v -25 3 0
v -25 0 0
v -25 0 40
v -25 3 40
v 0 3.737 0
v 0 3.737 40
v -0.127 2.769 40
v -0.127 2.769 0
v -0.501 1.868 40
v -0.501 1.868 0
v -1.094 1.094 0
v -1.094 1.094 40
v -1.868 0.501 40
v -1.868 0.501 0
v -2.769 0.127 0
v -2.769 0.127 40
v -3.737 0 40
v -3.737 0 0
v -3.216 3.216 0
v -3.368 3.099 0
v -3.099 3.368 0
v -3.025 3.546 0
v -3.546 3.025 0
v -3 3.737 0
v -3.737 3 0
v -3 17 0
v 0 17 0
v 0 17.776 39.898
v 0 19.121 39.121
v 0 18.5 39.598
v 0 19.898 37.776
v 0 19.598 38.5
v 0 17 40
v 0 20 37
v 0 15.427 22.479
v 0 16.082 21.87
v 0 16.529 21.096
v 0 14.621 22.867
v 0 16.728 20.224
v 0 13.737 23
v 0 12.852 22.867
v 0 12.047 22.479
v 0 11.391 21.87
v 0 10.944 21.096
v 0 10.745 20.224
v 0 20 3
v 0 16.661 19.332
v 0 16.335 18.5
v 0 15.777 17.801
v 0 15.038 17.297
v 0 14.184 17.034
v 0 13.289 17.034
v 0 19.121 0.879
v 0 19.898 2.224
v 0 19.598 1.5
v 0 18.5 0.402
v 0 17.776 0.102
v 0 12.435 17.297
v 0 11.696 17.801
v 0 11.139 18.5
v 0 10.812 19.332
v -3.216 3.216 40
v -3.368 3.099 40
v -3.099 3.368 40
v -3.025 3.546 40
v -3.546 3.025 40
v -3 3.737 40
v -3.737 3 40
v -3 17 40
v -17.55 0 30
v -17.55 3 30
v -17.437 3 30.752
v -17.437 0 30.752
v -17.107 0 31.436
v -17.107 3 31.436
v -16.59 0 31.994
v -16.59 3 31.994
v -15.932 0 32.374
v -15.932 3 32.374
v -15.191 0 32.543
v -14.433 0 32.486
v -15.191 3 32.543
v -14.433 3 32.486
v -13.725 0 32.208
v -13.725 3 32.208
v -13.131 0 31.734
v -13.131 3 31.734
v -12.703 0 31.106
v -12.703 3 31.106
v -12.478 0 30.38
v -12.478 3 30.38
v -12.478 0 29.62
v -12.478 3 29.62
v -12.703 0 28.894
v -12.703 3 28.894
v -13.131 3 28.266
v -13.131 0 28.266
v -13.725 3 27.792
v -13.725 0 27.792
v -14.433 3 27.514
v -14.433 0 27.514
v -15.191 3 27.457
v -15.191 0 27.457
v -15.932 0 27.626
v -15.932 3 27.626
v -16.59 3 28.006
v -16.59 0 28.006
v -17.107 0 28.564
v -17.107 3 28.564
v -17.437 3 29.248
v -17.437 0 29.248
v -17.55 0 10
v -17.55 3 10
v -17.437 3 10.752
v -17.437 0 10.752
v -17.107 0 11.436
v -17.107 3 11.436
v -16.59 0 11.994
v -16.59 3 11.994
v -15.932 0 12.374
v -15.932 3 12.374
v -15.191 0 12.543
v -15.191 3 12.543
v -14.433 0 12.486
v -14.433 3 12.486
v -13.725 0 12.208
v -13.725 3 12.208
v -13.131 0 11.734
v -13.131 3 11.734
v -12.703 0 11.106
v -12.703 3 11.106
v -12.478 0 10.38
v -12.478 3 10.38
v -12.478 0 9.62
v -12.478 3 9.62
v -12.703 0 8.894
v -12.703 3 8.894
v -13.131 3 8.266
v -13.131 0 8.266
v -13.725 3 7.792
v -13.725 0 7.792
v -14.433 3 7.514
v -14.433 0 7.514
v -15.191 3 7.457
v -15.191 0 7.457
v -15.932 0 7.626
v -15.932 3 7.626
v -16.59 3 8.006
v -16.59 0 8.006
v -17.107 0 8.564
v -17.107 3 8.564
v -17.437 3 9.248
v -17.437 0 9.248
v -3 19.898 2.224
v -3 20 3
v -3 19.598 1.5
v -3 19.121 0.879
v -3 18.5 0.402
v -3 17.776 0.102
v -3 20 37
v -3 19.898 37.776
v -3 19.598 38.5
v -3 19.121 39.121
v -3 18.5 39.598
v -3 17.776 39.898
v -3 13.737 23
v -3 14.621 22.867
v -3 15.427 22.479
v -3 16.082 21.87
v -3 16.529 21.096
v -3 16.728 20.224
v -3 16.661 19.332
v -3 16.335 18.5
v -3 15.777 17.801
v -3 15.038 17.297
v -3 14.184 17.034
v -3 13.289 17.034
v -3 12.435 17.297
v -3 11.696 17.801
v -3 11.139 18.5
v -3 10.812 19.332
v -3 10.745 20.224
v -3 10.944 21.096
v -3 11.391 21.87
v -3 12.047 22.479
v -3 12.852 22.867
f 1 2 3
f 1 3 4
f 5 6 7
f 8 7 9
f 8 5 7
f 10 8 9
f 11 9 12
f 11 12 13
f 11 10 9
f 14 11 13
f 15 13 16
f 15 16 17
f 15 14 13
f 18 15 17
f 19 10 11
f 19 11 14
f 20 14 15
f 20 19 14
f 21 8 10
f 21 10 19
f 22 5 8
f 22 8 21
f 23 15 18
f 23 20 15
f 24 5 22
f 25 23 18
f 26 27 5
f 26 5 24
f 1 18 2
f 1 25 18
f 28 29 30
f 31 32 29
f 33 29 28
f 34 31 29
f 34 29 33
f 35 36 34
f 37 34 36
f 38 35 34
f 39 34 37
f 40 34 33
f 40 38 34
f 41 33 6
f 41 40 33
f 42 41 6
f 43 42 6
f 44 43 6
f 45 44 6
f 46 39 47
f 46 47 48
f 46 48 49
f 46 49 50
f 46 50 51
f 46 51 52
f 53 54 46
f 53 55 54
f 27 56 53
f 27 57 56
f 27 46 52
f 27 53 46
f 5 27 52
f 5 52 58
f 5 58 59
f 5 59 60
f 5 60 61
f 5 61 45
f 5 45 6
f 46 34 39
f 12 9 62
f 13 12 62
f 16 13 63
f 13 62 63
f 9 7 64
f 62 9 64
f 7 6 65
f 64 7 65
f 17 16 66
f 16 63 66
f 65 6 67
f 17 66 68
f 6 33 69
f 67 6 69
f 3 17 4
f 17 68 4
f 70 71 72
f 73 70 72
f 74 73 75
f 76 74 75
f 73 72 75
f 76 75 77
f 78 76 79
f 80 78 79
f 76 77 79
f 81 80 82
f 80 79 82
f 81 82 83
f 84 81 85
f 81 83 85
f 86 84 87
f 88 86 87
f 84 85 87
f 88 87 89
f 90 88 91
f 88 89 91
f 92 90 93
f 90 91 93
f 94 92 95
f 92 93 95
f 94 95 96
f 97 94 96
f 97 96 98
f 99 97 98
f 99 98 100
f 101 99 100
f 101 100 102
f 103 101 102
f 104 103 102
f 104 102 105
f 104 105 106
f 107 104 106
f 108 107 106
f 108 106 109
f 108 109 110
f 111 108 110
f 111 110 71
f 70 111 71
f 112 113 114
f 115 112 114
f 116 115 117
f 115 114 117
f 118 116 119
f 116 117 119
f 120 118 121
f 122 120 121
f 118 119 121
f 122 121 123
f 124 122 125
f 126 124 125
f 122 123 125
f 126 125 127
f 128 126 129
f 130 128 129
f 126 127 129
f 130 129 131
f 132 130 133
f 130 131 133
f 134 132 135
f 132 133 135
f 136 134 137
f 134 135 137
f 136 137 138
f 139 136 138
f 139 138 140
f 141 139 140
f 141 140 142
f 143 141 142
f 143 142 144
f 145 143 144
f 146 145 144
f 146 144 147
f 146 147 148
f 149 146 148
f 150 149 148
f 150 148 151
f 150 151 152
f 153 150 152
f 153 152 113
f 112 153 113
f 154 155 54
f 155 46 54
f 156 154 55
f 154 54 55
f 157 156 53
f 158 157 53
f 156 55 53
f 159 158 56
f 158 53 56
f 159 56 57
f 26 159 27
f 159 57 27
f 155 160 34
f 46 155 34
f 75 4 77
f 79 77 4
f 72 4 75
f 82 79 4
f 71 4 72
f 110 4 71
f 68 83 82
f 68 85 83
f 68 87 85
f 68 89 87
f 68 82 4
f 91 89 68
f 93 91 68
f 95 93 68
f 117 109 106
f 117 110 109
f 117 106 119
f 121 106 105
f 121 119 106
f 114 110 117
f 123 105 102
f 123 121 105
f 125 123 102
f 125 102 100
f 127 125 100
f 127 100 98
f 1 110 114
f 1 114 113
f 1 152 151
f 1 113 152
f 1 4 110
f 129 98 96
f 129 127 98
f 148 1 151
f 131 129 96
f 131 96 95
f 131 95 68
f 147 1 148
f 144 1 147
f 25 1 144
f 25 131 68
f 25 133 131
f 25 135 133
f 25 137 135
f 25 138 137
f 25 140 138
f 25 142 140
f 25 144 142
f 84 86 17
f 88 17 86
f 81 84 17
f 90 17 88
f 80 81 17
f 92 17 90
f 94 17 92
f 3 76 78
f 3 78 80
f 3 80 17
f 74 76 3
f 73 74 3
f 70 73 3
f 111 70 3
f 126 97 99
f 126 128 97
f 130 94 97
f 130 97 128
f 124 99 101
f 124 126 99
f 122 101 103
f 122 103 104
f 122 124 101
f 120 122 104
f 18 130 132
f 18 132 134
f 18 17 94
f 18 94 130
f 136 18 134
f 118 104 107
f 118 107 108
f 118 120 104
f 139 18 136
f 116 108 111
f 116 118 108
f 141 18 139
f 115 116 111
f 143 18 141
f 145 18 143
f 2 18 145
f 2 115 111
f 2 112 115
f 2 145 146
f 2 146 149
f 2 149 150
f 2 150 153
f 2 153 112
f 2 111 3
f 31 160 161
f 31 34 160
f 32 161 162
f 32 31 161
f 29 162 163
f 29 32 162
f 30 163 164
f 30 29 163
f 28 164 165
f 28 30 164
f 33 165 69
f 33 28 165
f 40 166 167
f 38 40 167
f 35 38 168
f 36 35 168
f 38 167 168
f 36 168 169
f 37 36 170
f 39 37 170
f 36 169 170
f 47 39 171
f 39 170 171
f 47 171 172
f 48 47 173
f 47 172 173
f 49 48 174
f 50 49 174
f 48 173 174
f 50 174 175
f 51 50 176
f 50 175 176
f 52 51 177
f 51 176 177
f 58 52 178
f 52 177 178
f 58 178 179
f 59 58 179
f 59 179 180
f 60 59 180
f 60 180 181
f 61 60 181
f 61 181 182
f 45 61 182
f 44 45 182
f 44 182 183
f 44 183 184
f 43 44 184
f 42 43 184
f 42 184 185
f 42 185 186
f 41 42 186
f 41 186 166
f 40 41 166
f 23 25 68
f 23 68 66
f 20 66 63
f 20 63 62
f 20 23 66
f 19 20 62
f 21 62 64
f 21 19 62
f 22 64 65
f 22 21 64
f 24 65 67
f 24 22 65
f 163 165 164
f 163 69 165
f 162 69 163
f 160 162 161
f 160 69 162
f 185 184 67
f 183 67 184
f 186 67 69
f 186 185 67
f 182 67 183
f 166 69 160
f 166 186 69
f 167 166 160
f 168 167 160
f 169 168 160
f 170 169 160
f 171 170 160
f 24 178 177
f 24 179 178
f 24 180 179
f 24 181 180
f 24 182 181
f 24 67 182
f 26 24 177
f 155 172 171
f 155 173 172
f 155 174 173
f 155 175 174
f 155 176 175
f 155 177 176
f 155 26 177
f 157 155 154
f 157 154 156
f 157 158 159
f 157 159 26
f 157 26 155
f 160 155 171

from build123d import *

# Parameters (mm, degrees)
BASE_FLANGE1_DEPTH = 40
CUT_EXTRUDE1_REACH = 52.14
SKETCH6_R          = 2.55
CUT_EXTRUDE2_REACH = 51.84
SKETCH7_R          = 3
FILLET1_R          = 3


# Sheet-metal steps are written as plain solids
with BuildPart() as part:
    # Sketch1 → Base-Flange1 (new body)
    with BuildSketch(Plane.XY):
        with BuildLine():
            Line((0, 20), (0, 3.7366))
            ThreePointArc((0, 3.7366), (-1.094424801, 1.094424801), (-3.7366, 0))
            Line((-3.7366, 0), (-25, 0))
            Line((-25, 0), (-25, 3))
            Line((-25, 3), (-3.7366, 3))
            ThreePointArc((-3.7366, 3), (-3.215745145, 3.215745145), (-3, 3.7366))
            Line((-3, 3.7366), (-3, 20))
            Line((-3, 20), (0, 20))
        make_face()
    extrude(amount=BASE_FLANGE1_DEPTH)

    # Sketch6 → Cut-Extrude1 (cut, up to next)
    with BuildSketch(Plane(origin=(0, 3, 0), x_dir=(1, 0, 0), z_dir=(0, 1, 0)), mode=Mode.PRIVATE) as cut_extrude1_sk1:
        with Locations(Location((-15, -10, 0), (0, 0, 180))):
            Circle(SKETCH6_R)
    cut_extrude1_tool1 = extrude(cut_extrude1_sk1.sketch, amount=-CUT_EXTRUDE1_REACH, mode=Mode.PRIVATE) & part.part
    # Sketch6 → Cut-Extrude1 (cut, up to next)
    with BuildSketch(Plane(origin=(0, 3, 0), x_dir=(1, 0, 0), z_dir=(0, 1, 0)), mode=Mode.PRIVATE) as cut_extrude1_sk2:
        with Locations(Location((-15, -30, 0), (0, 0, 180))):
            Circle(SKETCH6_R)
    cut_extrude1_tool2 = extrude(cut_extrude1_sk2.sketch, amount=-CUT_EXTRUDE1_REACH, mode=Mode.PRIVATE) & part.part
    add(cut_extrude1_tool1.solids().sort_by_distance((-15, 3, 10))[0], mode=Mode.SUBTRACT)
    add(cut_extrude1_tool2.solids().sort_by_distance((-15, 3, 30))[0], mode=Mode.SUBTRACT)

    # Sketch7 → Cut-Extrude2 (cut, up to next)
    with BuildSketch(Plane.ZY.offset(3), mode=Mode.PRIVATE) as cut_extrude2_sk1:
        with Locations((20, 13.7366)):
            Circle(SKETCH7_R)
    cut_extrude2_tool1 = extrude(cut_extrude2_sk1.sketch, amount=-CUT_EXTRUDE2_REACH, mode=Mode.PRIVATE) & part.part
    add(cut_extrude2_tool1.solids().sort_by_distance((-3, 13.7366, 20))[0], mode=Mode.SUBTRACT)

    # Fillet1
    fillet1_edges = [part.edges().sort_by_distance(p)[0] for p in [
        (-1.5, 20, 40),
        (-1.5, 20, 0),
    ]]
    fillet(fillet1_edges, radius=FILLET1_R)


solid = part.part
